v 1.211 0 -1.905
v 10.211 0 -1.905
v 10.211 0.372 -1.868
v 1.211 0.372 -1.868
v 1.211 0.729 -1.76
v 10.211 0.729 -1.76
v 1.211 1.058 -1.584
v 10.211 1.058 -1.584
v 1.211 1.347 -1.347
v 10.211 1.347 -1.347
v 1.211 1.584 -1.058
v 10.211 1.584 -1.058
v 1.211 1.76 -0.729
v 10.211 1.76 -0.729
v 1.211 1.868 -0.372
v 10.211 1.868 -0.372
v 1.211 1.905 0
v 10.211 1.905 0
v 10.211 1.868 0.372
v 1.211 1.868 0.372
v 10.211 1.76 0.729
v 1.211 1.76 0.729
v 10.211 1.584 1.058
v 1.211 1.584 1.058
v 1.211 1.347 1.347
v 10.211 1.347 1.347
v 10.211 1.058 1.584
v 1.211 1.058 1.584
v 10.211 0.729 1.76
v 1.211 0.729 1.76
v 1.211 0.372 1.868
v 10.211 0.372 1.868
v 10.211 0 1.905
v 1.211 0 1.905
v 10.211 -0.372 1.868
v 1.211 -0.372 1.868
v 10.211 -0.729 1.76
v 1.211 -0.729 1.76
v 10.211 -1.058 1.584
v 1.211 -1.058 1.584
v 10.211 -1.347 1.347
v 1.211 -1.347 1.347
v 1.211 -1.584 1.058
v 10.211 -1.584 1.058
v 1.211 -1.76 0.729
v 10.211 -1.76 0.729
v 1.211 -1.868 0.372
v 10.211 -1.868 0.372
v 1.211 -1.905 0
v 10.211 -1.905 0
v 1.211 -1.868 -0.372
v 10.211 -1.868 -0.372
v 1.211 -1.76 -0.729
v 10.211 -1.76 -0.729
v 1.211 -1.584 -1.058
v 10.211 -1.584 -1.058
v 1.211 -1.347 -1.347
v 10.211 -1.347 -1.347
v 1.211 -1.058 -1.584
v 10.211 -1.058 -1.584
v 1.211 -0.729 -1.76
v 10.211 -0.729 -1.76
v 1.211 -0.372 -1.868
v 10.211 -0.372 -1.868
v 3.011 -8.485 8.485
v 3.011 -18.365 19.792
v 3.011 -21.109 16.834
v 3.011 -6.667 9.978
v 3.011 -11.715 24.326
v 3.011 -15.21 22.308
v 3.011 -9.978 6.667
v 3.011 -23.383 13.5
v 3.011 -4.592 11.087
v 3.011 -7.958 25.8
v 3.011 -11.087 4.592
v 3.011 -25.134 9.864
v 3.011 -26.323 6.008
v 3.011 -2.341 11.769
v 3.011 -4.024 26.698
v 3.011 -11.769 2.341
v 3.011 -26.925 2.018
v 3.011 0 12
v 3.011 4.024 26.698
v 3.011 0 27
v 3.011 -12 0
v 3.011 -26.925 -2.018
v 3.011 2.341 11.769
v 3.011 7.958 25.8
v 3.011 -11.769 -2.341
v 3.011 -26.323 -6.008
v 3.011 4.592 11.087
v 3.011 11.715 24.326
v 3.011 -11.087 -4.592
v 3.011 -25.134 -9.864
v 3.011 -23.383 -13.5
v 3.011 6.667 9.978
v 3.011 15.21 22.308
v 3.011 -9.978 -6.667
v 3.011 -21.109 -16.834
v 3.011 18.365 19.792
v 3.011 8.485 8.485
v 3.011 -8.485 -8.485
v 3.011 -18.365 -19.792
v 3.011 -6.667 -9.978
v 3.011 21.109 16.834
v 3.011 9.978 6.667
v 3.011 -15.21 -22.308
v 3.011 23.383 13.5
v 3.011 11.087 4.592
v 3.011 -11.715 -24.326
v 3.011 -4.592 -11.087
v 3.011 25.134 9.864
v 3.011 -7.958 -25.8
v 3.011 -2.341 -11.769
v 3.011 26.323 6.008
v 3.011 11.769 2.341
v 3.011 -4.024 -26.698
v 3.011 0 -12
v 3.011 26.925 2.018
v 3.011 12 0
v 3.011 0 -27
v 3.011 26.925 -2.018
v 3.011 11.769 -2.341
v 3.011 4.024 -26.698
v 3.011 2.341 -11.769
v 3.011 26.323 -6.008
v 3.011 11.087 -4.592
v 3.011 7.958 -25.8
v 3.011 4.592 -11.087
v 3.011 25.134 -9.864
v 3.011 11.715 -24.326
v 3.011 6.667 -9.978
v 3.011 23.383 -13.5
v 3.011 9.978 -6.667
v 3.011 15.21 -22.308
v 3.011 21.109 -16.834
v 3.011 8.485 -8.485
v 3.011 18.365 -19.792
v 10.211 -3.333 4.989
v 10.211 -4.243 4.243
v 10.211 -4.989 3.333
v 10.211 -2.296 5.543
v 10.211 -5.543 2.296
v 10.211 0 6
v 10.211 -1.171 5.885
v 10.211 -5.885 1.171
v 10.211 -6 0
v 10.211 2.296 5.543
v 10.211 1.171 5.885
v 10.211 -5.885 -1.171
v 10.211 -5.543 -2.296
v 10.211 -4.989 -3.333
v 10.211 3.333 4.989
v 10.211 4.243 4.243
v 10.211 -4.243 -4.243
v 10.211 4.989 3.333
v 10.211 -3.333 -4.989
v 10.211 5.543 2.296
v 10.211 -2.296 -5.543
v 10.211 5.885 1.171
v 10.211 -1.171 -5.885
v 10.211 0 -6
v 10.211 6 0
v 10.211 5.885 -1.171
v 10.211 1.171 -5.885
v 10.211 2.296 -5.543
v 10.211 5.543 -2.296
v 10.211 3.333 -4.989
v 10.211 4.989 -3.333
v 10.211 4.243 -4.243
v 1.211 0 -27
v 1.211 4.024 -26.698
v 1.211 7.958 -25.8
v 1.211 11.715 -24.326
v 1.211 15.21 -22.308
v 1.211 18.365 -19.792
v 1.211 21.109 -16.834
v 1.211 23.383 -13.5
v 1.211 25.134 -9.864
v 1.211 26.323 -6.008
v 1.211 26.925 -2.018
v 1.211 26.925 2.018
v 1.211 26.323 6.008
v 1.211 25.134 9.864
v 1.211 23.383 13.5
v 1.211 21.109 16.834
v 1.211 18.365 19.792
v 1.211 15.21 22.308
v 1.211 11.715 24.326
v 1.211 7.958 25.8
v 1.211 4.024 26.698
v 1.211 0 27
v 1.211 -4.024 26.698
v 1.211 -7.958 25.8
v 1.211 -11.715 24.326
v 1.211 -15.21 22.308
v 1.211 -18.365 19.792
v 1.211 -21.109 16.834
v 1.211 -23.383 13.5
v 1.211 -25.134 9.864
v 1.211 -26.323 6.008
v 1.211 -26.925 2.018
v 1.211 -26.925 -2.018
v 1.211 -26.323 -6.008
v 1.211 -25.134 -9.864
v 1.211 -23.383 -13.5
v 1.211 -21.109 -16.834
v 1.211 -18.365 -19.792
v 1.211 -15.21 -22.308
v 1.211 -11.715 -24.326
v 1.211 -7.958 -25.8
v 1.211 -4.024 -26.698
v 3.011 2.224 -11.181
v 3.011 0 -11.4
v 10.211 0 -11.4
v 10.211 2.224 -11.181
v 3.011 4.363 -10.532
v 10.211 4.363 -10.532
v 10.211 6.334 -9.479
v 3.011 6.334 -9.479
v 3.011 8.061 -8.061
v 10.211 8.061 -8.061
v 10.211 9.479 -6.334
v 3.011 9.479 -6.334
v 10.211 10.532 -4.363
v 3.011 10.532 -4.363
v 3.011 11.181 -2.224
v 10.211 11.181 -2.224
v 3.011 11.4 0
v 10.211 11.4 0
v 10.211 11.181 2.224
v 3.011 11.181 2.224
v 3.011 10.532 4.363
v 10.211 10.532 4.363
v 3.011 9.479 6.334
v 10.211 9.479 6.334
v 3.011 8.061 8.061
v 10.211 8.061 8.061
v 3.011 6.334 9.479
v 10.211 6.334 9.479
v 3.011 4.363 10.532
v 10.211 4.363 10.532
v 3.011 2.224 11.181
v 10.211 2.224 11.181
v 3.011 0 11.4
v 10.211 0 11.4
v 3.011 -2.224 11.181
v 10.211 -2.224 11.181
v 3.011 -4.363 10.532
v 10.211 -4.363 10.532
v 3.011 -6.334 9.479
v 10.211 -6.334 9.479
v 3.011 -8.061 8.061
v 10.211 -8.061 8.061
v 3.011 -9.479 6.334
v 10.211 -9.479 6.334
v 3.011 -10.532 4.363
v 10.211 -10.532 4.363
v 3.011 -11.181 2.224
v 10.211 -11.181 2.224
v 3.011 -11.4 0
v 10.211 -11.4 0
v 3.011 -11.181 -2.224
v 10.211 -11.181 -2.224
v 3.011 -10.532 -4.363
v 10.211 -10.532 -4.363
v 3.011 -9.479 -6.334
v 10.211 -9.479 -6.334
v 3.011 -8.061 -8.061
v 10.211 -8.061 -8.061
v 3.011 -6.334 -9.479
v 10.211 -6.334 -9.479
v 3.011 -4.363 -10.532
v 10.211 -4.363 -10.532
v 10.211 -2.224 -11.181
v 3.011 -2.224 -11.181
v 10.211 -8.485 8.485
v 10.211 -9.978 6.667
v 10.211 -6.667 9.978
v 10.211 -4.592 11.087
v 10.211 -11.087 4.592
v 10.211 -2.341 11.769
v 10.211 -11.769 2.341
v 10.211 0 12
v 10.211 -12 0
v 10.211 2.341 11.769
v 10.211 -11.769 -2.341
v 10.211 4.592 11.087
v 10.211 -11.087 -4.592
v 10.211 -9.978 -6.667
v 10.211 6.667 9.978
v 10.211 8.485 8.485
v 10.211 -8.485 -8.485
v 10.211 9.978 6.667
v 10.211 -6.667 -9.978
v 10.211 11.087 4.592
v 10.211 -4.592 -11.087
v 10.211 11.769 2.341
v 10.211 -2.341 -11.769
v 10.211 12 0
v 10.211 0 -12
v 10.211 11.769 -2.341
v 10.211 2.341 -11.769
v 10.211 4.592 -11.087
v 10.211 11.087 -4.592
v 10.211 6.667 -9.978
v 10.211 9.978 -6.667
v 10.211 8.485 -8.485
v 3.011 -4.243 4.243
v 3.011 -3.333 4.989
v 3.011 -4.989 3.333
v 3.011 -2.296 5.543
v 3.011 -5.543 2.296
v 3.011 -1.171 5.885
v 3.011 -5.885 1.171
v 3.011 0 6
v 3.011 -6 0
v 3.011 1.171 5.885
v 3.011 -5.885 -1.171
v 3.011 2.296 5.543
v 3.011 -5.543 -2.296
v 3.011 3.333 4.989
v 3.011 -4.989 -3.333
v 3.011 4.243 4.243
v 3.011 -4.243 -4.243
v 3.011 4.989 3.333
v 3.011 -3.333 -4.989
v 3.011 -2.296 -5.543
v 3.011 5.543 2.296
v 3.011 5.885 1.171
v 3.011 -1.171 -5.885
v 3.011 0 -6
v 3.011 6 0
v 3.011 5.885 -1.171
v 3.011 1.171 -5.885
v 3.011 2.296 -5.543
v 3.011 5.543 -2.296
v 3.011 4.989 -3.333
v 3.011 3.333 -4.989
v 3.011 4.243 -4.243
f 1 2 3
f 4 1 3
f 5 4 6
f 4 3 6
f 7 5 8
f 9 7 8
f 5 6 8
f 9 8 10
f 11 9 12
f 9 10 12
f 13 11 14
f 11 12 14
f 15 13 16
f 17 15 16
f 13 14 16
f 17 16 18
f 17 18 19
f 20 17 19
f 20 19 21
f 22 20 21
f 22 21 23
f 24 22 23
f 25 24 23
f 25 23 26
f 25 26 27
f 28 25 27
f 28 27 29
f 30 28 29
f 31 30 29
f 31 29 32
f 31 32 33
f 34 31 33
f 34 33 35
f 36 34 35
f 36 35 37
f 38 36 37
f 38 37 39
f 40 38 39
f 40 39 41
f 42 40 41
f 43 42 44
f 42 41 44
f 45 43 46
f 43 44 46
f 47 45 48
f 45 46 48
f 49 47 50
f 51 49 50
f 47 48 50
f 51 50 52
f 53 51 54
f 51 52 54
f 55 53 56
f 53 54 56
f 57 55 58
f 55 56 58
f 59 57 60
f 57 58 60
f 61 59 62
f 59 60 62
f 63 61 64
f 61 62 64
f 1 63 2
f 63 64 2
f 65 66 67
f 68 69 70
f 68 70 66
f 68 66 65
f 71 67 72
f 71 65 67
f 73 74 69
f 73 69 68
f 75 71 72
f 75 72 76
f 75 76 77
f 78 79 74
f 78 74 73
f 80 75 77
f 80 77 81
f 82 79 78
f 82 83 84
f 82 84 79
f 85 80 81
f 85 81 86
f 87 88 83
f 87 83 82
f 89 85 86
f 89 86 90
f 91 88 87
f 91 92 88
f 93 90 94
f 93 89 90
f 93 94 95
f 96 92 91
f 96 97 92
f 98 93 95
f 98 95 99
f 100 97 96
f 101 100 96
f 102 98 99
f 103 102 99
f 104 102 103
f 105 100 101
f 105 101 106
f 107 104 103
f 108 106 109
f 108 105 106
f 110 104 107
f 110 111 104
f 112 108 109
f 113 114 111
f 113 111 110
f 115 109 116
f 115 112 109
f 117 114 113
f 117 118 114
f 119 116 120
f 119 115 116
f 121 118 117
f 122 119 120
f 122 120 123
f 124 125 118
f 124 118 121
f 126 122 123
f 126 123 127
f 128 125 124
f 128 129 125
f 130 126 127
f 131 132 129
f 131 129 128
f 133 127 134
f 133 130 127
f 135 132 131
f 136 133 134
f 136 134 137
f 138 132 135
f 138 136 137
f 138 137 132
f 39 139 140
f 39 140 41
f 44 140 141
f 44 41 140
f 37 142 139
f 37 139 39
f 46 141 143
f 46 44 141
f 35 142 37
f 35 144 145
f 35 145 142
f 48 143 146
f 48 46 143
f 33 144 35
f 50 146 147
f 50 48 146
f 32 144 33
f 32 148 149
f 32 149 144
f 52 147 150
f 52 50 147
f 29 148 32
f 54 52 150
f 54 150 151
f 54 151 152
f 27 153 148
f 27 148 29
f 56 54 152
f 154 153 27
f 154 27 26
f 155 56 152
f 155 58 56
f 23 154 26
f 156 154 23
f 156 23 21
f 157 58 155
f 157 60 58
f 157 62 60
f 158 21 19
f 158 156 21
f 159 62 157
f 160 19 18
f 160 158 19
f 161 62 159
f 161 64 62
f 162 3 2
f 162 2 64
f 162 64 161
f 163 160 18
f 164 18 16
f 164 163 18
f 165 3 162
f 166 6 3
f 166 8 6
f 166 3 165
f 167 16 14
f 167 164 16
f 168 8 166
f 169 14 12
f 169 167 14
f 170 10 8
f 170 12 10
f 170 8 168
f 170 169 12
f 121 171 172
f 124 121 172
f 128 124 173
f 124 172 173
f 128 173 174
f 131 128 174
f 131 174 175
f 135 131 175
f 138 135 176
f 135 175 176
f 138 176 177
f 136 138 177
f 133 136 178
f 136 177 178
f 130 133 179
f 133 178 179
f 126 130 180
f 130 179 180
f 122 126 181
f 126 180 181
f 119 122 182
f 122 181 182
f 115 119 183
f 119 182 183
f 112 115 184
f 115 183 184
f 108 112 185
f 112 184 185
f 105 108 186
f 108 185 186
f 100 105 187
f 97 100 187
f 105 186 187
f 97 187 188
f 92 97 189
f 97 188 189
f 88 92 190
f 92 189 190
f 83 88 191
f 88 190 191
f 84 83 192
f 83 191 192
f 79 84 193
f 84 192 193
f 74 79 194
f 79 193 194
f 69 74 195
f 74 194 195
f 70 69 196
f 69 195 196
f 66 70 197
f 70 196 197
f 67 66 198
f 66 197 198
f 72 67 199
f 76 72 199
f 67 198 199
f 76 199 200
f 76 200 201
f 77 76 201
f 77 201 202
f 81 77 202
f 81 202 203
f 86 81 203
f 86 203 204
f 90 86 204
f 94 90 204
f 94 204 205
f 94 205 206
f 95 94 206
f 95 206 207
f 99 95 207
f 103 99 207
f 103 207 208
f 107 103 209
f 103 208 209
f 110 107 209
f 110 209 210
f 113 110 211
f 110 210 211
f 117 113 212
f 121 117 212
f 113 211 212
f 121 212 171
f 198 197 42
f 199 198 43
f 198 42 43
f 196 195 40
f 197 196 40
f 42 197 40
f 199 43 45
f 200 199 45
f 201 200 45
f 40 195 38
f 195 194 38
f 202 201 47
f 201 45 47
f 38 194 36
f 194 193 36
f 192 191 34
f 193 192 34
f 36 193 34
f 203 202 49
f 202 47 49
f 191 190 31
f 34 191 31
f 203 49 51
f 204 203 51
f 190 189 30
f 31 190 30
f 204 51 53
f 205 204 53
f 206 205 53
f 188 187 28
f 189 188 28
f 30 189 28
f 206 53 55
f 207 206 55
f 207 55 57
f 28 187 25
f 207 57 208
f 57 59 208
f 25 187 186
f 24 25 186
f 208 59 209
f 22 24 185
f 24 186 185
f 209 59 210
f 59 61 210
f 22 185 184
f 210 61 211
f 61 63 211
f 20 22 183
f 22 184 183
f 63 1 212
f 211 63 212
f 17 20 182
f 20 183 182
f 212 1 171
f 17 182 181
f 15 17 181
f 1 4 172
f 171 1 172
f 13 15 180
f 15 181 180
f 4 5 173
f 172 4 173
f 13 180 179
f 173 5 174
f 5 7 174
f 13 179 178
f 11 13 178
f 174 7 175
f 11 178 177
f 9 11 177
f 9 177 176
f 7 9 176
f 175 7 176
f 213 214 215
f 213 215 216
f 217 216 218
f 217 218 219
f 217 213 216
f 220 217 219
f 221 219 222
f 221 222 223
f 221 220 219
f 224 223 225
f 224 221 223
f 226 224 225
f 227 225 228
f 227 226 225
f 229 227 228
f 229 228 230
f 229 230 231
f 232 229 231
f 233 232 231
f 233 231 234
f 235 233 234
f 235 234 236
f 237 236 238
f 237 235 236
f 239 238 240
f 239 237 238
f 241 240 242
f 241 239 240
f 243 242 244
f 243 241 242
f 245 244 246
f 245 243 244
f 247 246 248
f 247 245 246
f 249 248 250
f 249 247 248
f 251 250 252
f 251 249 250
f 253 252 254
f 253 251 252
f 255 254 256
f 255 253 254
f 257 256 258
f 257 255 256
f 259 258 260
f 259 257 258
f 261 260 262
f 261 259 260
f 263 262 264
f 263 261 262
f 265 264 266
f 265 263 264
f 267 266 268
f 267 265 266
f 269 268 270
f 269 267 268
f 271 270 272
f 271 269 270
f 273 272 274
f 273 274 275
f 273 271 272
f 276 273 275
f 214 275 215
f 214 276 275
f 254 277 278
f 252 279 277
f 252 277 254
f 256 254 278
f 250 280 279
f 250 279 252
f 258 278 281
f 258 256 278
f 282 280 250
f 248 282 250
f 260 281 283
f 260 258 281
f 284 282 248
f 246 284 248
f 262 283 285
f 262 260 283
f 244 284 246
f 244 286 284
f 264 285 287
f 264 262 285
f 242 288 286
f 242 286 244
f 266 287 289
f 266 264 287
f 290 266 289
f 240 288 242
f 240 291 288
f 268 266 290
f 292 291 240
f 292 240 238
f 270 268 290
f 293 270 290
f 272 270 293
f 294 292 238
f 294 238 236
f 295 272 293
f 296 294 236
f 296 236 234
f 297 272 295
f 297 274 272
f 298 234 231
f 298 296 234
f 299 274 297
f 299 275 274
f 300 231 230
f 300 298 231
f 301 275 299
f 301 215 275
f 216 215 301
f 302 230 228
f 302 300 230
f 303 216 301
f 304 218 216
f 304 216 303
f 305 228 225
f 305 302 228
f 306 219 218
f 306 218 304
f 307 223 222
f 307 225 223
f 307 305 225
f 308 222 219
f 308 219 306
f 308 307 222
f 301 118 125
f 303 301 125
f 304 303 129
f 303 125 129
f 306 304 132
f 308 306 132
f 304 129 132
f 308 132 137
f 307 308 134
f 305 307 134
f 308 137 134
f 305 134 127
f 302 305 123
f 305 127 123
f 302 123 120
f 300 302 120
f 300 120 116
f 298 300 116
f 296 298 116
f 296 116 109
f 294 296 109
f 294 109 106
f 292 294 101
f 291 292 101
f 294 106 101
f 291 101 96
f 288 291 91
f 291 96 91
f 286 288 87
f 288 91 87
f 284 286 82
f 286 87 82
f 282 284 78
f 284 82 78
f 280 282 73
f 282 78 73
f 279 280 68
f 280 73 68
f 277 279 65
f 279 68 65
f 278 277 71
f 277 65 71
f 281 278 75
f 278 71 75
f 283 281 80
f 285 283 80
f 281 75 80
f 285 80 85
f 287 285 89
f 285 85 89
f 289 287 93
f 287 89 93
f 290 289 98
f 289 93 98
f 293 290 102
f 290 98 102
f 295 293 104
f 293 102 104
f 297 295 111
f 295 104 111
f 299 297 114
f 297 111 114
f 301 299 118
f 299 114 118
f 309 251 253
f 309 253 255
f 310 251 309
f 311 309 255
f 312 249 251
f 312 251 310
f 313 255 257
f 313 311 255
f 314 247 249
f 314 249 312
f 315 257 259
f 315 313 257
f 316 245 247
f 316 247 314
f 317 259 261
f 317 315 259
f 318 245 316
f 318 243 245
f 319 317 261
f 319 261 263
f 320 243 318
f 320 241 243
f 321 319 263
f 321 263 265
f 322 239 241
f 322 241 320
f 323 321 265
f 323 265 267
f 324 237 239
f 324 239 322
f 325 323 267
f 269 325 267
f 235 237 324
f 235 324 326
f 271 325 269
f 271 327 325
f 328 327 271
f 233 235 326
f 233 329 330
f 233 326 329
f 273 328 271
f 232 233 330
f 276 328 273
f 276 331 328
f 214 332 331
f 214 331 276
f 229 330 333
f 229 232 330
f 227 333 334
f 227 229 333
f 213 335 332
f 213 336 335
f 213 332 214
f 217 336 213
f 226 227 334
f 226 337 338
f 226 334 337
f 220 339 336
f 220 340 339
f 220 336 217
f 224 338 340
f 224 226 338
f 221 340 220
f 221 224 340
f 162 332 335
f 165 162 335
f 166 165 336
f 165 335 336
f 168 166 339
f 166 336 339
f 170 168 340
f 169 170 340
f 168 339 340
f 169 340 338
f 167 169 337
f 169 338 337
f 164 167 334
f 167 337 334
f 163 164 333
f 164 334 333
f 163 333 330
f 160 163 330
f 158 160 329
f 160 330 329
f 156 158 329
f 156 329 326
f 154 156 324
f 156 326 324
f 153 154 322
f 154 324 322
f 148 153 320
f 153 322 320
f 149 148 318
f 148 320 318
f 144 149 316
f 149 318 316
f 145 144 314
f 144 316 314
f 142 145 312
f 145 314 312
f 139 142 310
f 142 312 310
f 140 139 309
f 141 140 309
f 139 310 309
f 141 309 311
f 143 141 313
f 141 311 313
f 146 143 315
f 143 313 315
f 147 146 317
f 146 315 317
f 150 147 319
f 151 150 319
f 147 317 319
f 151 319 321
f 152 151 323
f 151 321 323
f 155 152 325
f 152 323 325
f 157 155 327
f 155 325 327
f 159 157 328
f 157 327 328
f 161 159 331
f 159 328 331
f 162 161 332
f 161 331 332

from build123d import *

# Parameters (mm, degrees)
SPROCKET_R                   = 45
ESTRUSIONE_ESTRUSIONE2_DEPTH = 3
SCHIZZO4_R                   = 10
ESTRUSIONE_ESTRUSIONE4_DEPTH = 12
SCHIZZO5_R                   = 20
SCHIZZO5_R_2                 = 19
ESTRUSIONE_ESTRUSIONE5_DEPTH = 12
SCHIZZO6_R                   = 3.175
TAGLIO_ESTRUSIONE1_DEPTH     = 16
SCALE1_SCALE                 = 0.6


with BuildPart() as part:
    # Sprocket → Estrusione-Estrusione2 (new body)
    with BuildSketch(Plane(origin=(0, 0, 0), x_dir=(0, 0, -1), z_dir=(1, 0, 0))):
        Circle(SPROCKET_R)
    extrude(amount=ESTRUSIONE_ESTRUSIONE2_DEPTH)

    # Schizzo4 → Estrusione-Estrusione4 (add)
    with BuildSketch(Plane(origin=(3, 0, 0), x_dir=(0, 0, -1), z_dir=(1, 0, 0))):
        Circle(SCHIZZO4_R)
    extrude(amount=ESTRUSIONE_ESTRUSIONE4_DEPTH)

    # Schizzo5 → Estrusione-Estrusione5 (add)
    with BuildSketch(Plane(origin=(3, 0, 0), x_dir=(0, 0, -1), z_dir=(1, 0, 0))):
        Circle(SCHIZZO5_R)
        Circle(SCHIZZO5_R_2, mode=Mode.SUBTRACT)
    extrude(amount=ESTRUSIONE_ESTRUSIONE5_DEPTH)

    # Schizzo6 → Taglio-Estrusione1 (cut, through all)
    with BuildSketch(Plane(origin=(15, 0, 0), x_dir=(0, 0, -1), z_dir=(1, 0, 0))):
        Circle(SCHIZZO6_R)
    extrude(amount=-TAGLIO_ESTRUSIONE1_DEPTH, mode=Mode.SUBTRACT)


with BuildPart() as part_1:
    # Scale1: scaled about (3.02832768, 0, 0)
    add(part.part.scale(SCALE1_SCALE).moved(Location((1.211331072, 0, 0))))


solid = part_1.part
